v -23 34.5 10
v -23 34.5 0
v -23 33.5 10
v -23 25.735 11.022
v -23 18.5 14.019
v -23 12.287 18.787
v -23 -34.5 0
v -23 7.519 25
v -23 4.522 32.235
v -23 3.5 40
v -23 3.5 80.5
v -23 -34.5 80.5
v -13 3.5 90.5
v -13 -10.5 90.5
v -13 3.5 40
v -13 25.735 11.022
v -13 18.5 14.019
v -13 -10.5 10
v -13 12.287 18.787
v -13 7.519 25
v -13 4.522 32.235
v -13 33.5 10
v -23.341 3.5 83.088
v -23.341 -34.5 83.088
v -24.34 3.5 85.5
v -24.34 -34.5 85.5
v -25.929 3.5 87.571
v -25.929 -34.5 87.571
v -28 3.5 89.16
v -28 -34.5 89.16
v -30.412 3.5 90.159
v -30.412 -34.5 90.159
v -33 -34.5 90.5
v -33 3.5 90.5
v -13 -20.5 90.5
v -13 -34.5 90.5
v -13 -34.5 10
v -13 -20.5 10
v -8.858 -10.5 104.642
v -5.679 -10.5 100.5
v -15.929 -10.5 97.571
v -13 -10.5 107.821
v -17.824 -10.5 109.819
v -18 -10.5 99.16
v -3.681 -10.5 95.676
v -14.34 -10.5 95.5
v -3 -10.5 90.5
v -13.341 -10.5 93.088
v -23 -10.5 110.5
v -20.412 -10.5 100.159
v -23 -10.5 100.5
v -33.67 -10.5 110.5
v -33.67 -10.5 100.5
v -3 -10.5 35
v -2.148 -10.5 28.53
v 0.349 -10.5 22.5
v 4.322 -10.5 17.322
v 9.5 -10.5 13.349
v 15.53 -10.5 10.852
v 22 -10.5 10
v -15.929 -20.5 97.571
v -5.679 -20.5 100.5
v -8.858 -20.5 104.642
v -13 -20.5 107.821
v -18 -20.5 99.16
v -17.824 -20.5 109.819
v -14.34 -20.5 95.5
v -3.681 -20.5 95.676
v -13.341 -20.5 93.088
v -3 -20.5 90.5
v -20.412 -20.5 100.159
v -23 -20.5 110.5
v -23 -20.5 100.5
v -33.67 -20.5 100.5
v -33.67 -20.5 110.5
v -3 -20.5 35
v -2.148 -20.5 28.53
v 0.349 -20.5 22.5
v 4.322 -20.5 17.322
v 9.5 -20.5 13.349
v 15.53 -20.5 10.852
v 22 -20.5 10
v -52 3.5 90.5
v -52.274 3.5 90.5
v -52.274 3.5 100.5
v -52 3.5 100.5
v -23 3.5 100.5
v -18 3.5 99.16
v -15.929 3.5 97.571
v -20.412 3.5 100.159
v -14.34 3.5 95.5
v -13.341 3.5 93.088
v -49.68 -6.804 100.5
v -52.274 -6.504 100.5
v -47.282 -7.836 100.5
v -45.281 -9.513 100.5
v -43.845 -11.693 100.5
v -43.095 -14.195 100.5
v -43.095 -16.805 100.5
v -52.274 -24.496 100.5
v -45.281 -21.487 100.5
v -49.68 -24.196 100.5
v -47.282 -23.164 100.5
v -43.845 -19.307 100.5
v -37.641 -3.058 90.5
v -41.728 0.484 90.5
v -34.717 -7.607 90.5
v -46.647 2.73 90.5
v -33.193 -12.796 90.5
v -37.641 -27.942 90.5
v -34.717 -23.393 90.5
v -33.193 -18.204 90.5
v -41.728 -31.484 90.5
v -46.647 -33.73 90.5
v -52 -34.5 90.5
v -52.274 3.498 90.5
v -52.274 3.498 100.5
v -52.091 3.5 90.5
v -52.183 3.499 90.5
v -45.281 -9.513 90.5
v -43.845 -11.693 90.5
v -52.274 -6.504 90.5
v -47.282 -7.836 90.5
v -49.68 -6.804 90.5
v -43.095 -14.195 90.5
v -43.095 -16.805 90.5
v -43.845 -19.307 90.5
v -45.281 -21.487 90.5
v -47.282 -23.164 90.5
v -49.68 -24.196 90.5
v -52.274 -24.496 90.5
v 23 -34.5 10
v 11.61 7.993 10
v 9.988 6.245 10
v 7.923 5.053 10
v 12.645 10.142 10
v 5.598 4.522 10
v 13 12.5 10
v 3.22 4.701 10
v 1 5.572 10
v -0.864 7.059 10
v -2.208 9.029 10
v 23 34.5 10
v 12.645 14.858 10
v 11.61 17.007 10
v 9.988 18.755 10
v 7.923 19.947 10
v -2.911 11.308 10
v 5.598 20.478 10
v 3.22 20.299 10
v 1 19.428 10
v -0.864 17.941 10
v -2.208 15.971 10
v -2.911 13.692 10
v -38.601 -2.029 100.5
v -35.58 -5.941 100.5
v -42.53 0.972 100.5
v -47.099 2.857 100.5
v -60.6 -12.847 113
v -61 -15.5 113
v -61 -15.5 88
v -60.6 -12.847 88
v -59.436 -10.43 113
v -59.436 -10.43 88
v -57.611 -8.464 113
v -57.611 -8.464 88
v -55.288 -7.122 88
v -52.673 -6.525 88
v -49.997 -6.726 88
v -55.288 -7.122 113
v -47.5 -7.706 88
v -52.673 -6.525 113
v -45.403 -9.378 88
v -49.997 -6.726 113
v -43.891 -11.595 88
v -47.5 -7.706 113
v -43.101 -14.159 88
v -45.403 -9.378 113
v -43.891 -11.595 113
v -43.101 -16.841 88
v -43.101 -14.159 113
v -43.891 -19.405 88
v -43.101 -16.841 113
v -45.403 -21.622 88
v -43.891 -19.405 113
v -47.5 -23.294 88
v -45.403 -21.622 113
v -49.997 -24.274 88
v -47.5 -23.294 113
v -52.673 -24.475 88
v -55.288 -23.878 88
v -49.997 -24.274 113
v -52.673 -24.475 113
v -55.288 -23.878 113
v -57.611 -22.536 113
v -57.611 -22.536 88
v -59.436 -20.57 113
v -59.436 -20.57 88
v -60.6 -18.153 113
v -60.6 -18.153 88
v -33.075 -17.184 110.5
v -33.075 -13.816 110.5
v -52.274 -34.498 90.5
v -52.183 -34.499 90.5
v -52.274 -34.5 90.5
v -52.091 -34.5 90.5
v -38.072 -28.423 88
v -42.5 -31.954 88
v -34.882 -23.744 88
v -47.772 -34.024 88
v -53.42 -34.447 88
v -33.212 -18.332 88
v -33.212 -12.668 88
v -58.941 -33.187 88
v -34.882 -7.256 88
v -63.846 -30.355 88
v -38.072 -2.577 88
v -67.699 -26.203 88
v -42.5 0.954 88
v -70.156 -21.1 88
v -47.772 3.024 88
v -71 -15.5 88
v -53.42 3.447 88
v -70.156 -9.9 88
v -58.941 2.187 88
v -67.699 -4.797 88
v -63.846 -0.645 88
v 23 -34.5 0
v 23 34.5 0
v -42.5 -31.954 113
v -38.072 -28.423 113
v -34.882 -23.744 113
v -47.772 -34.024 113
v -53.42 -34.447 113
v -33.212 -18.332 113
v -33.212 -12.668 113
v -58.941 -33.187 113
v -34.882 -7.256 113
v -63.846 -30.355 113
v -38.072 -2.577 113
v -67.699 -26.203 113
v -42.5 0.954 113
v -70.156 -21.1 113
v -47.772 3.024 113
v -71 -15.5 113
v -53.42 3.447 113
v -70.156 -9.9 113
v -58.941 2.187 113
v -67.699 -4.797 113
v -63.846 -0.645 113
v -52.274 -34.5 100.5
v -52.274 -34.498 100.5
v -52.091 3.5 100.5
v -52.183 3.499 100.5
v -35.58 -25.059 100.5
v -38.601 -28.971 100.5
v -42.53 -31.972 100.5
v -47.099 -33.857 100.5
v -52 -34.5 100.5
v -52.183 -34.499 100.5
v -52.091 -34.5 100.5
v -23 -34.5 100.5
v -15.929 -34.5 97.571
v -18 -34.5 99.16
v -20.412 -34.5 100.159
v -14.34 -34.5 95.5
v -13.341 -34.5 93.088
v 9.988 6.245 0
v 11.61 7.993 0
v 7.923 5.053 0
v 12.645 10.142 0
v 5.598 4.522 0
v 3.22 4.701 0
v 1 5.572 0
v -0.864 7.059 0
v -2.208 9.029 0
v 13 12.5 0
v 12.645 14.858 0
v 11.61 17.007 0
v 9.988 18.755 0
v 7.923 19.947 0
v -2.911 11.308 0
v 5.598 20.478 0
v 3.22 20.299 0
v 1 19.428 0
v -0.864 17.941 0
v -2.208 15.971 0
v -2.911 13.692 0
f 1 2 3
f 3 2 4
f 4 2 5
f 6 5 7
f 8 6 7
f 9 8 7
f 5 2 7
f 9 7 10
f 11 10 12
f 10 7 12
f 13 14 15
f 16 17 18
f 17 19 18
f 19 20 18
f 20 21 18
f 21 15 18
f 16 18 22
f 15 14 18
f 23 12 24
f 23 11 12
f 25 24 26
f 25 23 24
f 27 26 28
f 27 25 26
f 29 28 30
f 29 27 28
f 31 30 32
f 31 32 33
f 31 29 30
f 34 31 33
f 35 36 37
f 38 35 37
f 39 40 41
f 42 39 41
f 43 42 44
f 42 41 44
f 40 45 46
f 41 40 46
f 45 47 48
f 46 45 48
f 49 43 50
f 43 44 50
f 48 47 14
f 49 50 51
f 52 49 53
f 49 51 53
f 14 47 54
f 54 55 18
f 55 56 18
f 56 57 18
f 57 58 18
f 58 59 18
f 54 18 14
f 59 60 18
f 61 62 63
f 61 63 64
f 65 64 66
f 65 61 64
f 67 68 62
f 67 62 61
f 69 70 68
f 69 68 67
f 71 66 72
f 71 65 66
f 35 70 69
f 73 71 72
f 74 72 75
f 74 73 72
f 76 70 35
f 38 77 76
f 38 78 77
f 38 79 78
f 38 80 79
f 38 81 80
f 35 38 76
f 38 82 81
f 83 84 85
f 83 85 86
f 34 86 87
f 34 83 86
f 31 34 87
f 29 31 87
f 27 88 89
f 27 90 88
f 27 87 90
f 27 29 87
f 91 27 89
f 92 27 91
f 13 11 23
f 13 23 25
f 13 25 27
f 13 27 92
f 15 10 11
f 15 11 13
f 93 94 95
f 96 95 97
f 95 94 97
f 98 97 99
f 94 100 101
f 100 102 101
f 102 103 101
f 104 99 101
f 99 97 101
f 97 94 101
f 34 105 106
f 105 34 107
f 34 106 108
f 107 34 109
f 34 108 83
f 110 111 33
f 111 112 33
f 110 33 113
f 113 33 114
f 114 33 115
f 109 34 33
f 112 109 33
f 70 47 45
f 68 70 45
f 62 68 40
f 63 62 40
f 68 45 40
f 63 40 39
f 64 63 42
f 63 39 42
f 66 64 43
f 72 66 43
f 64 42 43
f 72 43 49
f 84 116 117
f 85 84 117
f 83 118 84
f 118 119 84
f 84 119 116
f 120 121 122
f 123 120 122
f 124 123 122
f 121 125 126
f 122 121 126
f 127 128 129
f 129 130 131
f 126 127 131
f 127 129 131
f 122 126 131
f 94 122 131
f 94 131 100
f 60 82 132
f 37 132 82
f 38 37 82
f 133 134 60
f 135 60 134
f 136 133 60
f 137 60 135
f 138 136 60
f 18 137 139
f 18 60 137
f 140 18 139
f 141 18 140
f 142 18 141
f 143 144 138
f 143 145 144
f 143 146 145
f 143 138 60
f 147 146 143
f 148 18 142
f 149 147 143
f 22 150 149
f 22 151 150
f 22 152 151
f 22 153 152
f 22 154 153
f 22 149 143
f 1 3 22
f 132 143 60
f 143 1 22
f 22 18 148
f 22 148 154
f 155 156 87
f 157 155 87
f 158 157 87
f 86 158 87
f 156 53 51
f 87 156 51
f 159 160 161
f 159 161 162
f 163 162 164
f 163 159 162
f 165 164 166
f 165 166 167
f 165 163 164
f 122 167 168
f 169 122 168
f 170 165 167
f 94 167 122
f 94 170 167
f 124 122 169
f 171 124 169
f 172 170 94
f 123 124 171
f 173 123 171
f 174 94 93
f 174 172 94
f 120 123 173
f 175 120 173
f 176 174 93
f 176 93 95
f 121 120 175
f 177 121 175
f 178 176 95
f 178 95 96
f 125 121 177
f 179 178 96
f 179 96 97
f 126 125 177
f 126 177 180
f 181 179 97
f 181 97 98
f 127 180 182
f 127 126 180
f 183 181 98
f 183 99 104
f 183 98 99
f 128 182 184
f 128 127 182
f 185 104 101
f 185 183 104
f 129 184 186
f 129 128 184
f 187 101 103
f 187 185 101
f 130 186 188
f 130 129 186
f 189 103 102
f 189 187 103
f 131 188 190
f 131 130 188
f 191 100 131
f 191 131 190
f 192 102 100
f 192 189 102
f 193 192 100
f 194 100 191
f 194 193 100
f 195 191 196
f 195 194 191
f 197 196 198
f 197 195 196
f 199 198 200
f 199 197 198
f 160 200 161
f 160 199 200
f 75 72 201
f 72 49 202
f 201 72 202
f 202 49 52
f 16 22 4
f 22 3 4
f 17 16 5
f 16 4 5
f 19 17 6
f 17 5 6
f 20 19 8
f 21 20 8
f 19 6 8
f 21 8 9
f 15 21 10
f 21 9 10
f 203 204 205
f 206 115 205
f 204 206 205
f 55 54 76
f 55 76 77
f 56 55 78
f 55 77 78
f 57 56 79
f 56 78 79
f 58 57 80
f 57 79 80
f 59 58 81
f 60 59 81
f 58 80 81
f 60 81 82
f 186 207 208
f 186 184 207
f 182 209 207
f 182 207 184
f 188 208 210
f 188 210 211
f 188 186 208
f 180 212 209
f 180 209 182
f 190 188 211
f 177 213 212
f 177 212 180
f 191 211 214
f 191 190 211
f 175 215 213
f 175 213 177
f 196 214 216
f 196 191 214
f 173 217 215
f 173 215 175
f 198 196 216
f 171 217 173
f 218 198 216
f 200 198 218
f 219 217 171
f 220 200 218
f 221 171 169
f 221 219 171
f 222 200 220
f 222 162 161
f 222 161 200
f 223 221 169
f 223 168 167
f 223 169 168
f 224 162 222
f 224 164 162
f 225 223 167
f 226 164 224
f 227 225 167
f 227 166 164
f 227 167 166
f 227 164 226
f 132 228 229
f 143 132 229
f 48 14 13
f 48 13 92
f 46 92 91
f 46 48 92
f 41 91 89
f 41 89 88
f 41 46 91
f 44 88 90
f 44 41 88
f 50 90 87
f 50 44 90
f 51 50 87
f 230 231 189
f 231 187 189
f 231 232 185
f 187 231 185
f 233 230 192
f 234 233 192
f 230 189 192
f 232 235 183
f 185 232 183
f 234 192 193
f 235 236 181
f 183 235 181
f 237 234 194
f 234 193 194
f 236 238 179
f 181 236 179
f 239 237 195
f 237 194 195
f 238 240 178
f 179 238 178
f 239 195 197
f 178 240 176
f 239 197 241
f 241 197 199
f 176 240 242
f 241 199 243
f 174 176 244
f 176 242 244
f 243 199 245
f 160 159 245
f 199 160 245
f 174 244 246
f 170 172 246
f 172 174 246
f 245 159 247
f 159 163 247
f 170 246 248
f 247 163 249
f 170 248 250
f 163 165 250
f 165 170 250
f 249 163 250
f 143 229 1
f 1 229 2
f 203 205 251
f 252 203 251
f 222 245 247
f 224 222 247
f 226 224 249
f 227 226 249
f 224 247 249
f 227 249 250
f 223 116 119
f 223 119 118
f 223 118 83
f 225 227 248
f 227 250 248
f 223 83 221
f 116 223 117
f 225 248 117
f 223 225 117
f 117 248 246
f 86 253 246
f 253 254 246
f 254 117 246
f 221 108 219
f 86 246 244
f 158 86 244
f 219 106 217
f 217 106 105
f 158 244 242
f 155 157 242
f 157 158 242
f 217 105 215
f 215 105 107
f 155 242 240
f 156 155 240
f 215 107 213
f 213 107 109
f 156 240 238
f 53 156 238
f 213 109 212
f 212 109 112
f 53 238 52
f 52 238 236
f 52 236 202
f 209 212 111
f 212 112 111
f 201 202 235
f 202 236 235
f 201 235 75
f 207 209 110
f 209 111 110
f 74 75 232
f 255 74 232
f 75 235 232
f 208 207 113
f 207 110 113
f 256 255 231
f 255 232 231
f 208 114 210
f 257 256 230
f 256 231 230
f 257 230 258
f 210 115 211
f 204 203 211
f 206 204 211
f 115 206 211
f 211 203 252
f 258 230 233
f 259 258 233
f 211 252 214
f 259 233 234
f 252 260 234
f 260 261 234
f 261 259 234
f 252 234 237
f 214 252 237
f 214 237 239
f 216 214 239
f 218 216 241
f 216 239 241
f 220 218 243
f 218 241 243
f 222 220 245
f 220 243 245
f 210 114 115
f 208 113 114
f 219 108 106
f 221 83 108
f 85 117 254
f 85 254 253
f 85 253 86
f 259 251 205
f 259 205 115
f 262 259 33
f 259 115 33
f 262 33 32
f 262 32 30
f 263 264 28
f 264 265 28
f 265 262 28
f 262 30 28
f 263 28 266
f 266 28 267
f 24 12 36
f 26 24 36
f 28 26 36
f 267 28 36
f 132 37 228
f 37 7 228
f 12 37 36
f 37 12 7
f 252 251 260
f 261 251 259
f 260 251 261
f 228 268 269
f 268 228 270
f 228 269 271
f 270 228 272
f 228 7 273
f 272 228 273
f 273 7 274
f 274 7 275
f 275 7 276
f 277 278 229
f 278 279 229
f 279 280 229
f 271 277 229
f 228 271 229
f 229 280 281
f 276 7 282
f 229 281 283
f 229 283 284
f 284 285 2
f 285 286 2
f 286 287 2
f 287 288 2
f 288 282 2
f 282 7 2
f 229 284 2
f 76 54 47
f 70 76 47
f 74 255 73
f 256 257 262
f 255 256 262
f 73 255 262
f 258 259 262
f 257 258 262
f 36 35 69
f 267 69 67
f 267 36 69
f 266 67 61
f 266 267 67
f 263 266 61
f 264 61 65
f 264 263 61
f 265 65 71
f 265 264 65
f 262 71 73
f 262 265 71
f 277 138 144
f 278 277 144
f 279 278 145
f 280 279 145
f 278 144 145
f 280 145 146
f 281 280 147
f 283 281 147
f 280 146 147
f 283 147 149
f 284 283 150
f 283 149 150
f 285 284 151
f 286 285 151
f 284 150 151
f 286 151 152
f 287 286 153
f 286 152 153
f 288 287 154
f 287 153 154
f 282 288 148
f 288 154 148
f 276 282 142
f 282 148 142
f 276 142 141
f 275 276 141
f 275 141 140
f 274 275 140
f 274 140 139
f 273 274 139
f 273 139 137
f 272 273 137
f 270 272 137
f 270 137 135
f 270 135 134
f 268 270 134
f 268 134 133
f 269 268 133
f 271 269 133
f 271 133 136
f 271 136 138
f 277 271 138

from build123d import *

# Parameters (mm, degrees)
SKETCH1_W           = 69
SKETCH1_H           = 46
BOSS_EXTRUDE1_DEPTH = 10
SKETCH2_R           = 19
SKETCH2_R_2         = 9
BOSS_EXTRUDE2_DEPTH = 25
BOSS_EXTRUDE3_DEPTH = 19
FILLET1_R           = 30
FILLET2_R           = 10
RIB1_START          = -5
RIB1_DEPTH          = 10
FILLET3_R           = 25
SKETCH7_R           = 8
CUT_EXTRUDE1_DEPTH  = 38


# Read off the part's stored shape, not the designer's step: Rib1
with BuildPart() as part:
    # Sketch1 → Boss-Extrude1 (new body)
    with BuildSketch(Plane(origin=(0, 0, 0), x_dir=(0, 1, 0), z_dir=(0, 0, 1))):
        Rectangle(SKETCH1_W, SKETCH1_H)
    extrude(amount=BOSS_EXTRUDE1_DEPTH)



with BuildPart() as body_2:
    # Sketch2 → Boss-Extrude2 (new body)
    with BuildSketch(Plane(origin=(0, 0, 113), x_dir=(-1, 0, 0), z_dir=(0, 0, -1))):
        with Locations((52, -15.5)):
            Circle(SKETCH2_R)
        with Locations((52, -15.5)):
            Circle(SKETCH2_R_2, mode=Mode.SUBTRACT)
    extrude(amount=BOSS_EXTRUDE2_DEPTH)


with BuildPart() as part_1:
    add(part.part)

    add(body_2.part)  # Boss-Extrude3 merges body 2
    # Sketch5 → Boss-Extrude3 (add, symmetric)
    with BuildSketch(Plane(origin=(0, -15.5, 0), x_dir=(-1, 0, 0), z_dir=(0, -1, 0))):
        Polygon((23, -10), (23, -90.5), (52.274133124, -90.5), (52.274133124, -100.5), (13, -100.5), (13, -10), align=None)
    extrude(amount=BOSS_EXTRUDE3_DEPTH, both=True)

    # Fillet1
    fillet1_edges = [part_1.edges().sort_by_distance(p)[0] for p in [
        (-18, 3.5, 10),
    ]]
    fillet(fillet1_edges, radius=FILLET1_R)

    # Fillet2
    fillet2_edges = [part_1.edges().sort_by_distance(p)[0] for p in [
        (-23, -15.5, 90.5),
    ]]
    fillet(fillet2_edges, radius=FILLET2_R - 0.0001)  # a hair under: the kernel refuses the full size
    fillet2_2_edges = [part_1.edges().sort_by_distance(p)[0] for p in [
        (-13, -15.5, 100.5),
    ]]
    fillet(fillet2_2_edges, radius=FILLET2_R)

    # Rib1 outline → Rib1 (add)
    with BuildSketch(Plane(origin=(0, -15.5, 0), x_dir=(-1, 0, 0), z_dir=(0, -1, 0)).offset(RIB1_START)):
        with BuildLine():
            Line((23, -110.5), (35, -110.5))
            Line((35, -110.5), (35, -100.5))
            Line((35, -100.5), (23, -100.5))
            ThreePointArc((23, -100.5), (15.928932188, -97.571067812), (13, -90.5))
            Line((13, -90.5), (13, -10))
            Line((13, -10), (3, -10))
            Line((3, -10), (3, -90.5))
            ThreePointArc((3, -90.5), (8.857864376, -104.642135624), (23, -110.5))
        make_face()
    extrude(amount=RIB1_DEPTH)

    # Fillet3
    fillet3_edges = [part_1.edges().sort_by_distance(p)[0] for p in [
        (-3, -15.5, 10),
    ]]
    fillet(fillet3_edges, radius=FILLET3_R)

    # Sketch7 → Cut-Extrude1 (cut)
    with BuildSketch(Plane.XY.offset(10)):
        with Locations((5, 12.5)):
            Circle(SKETCH7_R)
    extrude(amount=-CUT_EXTRUDE1_DEPTH, mode=Mode.SUBTRACT)


solid = part_1.part
